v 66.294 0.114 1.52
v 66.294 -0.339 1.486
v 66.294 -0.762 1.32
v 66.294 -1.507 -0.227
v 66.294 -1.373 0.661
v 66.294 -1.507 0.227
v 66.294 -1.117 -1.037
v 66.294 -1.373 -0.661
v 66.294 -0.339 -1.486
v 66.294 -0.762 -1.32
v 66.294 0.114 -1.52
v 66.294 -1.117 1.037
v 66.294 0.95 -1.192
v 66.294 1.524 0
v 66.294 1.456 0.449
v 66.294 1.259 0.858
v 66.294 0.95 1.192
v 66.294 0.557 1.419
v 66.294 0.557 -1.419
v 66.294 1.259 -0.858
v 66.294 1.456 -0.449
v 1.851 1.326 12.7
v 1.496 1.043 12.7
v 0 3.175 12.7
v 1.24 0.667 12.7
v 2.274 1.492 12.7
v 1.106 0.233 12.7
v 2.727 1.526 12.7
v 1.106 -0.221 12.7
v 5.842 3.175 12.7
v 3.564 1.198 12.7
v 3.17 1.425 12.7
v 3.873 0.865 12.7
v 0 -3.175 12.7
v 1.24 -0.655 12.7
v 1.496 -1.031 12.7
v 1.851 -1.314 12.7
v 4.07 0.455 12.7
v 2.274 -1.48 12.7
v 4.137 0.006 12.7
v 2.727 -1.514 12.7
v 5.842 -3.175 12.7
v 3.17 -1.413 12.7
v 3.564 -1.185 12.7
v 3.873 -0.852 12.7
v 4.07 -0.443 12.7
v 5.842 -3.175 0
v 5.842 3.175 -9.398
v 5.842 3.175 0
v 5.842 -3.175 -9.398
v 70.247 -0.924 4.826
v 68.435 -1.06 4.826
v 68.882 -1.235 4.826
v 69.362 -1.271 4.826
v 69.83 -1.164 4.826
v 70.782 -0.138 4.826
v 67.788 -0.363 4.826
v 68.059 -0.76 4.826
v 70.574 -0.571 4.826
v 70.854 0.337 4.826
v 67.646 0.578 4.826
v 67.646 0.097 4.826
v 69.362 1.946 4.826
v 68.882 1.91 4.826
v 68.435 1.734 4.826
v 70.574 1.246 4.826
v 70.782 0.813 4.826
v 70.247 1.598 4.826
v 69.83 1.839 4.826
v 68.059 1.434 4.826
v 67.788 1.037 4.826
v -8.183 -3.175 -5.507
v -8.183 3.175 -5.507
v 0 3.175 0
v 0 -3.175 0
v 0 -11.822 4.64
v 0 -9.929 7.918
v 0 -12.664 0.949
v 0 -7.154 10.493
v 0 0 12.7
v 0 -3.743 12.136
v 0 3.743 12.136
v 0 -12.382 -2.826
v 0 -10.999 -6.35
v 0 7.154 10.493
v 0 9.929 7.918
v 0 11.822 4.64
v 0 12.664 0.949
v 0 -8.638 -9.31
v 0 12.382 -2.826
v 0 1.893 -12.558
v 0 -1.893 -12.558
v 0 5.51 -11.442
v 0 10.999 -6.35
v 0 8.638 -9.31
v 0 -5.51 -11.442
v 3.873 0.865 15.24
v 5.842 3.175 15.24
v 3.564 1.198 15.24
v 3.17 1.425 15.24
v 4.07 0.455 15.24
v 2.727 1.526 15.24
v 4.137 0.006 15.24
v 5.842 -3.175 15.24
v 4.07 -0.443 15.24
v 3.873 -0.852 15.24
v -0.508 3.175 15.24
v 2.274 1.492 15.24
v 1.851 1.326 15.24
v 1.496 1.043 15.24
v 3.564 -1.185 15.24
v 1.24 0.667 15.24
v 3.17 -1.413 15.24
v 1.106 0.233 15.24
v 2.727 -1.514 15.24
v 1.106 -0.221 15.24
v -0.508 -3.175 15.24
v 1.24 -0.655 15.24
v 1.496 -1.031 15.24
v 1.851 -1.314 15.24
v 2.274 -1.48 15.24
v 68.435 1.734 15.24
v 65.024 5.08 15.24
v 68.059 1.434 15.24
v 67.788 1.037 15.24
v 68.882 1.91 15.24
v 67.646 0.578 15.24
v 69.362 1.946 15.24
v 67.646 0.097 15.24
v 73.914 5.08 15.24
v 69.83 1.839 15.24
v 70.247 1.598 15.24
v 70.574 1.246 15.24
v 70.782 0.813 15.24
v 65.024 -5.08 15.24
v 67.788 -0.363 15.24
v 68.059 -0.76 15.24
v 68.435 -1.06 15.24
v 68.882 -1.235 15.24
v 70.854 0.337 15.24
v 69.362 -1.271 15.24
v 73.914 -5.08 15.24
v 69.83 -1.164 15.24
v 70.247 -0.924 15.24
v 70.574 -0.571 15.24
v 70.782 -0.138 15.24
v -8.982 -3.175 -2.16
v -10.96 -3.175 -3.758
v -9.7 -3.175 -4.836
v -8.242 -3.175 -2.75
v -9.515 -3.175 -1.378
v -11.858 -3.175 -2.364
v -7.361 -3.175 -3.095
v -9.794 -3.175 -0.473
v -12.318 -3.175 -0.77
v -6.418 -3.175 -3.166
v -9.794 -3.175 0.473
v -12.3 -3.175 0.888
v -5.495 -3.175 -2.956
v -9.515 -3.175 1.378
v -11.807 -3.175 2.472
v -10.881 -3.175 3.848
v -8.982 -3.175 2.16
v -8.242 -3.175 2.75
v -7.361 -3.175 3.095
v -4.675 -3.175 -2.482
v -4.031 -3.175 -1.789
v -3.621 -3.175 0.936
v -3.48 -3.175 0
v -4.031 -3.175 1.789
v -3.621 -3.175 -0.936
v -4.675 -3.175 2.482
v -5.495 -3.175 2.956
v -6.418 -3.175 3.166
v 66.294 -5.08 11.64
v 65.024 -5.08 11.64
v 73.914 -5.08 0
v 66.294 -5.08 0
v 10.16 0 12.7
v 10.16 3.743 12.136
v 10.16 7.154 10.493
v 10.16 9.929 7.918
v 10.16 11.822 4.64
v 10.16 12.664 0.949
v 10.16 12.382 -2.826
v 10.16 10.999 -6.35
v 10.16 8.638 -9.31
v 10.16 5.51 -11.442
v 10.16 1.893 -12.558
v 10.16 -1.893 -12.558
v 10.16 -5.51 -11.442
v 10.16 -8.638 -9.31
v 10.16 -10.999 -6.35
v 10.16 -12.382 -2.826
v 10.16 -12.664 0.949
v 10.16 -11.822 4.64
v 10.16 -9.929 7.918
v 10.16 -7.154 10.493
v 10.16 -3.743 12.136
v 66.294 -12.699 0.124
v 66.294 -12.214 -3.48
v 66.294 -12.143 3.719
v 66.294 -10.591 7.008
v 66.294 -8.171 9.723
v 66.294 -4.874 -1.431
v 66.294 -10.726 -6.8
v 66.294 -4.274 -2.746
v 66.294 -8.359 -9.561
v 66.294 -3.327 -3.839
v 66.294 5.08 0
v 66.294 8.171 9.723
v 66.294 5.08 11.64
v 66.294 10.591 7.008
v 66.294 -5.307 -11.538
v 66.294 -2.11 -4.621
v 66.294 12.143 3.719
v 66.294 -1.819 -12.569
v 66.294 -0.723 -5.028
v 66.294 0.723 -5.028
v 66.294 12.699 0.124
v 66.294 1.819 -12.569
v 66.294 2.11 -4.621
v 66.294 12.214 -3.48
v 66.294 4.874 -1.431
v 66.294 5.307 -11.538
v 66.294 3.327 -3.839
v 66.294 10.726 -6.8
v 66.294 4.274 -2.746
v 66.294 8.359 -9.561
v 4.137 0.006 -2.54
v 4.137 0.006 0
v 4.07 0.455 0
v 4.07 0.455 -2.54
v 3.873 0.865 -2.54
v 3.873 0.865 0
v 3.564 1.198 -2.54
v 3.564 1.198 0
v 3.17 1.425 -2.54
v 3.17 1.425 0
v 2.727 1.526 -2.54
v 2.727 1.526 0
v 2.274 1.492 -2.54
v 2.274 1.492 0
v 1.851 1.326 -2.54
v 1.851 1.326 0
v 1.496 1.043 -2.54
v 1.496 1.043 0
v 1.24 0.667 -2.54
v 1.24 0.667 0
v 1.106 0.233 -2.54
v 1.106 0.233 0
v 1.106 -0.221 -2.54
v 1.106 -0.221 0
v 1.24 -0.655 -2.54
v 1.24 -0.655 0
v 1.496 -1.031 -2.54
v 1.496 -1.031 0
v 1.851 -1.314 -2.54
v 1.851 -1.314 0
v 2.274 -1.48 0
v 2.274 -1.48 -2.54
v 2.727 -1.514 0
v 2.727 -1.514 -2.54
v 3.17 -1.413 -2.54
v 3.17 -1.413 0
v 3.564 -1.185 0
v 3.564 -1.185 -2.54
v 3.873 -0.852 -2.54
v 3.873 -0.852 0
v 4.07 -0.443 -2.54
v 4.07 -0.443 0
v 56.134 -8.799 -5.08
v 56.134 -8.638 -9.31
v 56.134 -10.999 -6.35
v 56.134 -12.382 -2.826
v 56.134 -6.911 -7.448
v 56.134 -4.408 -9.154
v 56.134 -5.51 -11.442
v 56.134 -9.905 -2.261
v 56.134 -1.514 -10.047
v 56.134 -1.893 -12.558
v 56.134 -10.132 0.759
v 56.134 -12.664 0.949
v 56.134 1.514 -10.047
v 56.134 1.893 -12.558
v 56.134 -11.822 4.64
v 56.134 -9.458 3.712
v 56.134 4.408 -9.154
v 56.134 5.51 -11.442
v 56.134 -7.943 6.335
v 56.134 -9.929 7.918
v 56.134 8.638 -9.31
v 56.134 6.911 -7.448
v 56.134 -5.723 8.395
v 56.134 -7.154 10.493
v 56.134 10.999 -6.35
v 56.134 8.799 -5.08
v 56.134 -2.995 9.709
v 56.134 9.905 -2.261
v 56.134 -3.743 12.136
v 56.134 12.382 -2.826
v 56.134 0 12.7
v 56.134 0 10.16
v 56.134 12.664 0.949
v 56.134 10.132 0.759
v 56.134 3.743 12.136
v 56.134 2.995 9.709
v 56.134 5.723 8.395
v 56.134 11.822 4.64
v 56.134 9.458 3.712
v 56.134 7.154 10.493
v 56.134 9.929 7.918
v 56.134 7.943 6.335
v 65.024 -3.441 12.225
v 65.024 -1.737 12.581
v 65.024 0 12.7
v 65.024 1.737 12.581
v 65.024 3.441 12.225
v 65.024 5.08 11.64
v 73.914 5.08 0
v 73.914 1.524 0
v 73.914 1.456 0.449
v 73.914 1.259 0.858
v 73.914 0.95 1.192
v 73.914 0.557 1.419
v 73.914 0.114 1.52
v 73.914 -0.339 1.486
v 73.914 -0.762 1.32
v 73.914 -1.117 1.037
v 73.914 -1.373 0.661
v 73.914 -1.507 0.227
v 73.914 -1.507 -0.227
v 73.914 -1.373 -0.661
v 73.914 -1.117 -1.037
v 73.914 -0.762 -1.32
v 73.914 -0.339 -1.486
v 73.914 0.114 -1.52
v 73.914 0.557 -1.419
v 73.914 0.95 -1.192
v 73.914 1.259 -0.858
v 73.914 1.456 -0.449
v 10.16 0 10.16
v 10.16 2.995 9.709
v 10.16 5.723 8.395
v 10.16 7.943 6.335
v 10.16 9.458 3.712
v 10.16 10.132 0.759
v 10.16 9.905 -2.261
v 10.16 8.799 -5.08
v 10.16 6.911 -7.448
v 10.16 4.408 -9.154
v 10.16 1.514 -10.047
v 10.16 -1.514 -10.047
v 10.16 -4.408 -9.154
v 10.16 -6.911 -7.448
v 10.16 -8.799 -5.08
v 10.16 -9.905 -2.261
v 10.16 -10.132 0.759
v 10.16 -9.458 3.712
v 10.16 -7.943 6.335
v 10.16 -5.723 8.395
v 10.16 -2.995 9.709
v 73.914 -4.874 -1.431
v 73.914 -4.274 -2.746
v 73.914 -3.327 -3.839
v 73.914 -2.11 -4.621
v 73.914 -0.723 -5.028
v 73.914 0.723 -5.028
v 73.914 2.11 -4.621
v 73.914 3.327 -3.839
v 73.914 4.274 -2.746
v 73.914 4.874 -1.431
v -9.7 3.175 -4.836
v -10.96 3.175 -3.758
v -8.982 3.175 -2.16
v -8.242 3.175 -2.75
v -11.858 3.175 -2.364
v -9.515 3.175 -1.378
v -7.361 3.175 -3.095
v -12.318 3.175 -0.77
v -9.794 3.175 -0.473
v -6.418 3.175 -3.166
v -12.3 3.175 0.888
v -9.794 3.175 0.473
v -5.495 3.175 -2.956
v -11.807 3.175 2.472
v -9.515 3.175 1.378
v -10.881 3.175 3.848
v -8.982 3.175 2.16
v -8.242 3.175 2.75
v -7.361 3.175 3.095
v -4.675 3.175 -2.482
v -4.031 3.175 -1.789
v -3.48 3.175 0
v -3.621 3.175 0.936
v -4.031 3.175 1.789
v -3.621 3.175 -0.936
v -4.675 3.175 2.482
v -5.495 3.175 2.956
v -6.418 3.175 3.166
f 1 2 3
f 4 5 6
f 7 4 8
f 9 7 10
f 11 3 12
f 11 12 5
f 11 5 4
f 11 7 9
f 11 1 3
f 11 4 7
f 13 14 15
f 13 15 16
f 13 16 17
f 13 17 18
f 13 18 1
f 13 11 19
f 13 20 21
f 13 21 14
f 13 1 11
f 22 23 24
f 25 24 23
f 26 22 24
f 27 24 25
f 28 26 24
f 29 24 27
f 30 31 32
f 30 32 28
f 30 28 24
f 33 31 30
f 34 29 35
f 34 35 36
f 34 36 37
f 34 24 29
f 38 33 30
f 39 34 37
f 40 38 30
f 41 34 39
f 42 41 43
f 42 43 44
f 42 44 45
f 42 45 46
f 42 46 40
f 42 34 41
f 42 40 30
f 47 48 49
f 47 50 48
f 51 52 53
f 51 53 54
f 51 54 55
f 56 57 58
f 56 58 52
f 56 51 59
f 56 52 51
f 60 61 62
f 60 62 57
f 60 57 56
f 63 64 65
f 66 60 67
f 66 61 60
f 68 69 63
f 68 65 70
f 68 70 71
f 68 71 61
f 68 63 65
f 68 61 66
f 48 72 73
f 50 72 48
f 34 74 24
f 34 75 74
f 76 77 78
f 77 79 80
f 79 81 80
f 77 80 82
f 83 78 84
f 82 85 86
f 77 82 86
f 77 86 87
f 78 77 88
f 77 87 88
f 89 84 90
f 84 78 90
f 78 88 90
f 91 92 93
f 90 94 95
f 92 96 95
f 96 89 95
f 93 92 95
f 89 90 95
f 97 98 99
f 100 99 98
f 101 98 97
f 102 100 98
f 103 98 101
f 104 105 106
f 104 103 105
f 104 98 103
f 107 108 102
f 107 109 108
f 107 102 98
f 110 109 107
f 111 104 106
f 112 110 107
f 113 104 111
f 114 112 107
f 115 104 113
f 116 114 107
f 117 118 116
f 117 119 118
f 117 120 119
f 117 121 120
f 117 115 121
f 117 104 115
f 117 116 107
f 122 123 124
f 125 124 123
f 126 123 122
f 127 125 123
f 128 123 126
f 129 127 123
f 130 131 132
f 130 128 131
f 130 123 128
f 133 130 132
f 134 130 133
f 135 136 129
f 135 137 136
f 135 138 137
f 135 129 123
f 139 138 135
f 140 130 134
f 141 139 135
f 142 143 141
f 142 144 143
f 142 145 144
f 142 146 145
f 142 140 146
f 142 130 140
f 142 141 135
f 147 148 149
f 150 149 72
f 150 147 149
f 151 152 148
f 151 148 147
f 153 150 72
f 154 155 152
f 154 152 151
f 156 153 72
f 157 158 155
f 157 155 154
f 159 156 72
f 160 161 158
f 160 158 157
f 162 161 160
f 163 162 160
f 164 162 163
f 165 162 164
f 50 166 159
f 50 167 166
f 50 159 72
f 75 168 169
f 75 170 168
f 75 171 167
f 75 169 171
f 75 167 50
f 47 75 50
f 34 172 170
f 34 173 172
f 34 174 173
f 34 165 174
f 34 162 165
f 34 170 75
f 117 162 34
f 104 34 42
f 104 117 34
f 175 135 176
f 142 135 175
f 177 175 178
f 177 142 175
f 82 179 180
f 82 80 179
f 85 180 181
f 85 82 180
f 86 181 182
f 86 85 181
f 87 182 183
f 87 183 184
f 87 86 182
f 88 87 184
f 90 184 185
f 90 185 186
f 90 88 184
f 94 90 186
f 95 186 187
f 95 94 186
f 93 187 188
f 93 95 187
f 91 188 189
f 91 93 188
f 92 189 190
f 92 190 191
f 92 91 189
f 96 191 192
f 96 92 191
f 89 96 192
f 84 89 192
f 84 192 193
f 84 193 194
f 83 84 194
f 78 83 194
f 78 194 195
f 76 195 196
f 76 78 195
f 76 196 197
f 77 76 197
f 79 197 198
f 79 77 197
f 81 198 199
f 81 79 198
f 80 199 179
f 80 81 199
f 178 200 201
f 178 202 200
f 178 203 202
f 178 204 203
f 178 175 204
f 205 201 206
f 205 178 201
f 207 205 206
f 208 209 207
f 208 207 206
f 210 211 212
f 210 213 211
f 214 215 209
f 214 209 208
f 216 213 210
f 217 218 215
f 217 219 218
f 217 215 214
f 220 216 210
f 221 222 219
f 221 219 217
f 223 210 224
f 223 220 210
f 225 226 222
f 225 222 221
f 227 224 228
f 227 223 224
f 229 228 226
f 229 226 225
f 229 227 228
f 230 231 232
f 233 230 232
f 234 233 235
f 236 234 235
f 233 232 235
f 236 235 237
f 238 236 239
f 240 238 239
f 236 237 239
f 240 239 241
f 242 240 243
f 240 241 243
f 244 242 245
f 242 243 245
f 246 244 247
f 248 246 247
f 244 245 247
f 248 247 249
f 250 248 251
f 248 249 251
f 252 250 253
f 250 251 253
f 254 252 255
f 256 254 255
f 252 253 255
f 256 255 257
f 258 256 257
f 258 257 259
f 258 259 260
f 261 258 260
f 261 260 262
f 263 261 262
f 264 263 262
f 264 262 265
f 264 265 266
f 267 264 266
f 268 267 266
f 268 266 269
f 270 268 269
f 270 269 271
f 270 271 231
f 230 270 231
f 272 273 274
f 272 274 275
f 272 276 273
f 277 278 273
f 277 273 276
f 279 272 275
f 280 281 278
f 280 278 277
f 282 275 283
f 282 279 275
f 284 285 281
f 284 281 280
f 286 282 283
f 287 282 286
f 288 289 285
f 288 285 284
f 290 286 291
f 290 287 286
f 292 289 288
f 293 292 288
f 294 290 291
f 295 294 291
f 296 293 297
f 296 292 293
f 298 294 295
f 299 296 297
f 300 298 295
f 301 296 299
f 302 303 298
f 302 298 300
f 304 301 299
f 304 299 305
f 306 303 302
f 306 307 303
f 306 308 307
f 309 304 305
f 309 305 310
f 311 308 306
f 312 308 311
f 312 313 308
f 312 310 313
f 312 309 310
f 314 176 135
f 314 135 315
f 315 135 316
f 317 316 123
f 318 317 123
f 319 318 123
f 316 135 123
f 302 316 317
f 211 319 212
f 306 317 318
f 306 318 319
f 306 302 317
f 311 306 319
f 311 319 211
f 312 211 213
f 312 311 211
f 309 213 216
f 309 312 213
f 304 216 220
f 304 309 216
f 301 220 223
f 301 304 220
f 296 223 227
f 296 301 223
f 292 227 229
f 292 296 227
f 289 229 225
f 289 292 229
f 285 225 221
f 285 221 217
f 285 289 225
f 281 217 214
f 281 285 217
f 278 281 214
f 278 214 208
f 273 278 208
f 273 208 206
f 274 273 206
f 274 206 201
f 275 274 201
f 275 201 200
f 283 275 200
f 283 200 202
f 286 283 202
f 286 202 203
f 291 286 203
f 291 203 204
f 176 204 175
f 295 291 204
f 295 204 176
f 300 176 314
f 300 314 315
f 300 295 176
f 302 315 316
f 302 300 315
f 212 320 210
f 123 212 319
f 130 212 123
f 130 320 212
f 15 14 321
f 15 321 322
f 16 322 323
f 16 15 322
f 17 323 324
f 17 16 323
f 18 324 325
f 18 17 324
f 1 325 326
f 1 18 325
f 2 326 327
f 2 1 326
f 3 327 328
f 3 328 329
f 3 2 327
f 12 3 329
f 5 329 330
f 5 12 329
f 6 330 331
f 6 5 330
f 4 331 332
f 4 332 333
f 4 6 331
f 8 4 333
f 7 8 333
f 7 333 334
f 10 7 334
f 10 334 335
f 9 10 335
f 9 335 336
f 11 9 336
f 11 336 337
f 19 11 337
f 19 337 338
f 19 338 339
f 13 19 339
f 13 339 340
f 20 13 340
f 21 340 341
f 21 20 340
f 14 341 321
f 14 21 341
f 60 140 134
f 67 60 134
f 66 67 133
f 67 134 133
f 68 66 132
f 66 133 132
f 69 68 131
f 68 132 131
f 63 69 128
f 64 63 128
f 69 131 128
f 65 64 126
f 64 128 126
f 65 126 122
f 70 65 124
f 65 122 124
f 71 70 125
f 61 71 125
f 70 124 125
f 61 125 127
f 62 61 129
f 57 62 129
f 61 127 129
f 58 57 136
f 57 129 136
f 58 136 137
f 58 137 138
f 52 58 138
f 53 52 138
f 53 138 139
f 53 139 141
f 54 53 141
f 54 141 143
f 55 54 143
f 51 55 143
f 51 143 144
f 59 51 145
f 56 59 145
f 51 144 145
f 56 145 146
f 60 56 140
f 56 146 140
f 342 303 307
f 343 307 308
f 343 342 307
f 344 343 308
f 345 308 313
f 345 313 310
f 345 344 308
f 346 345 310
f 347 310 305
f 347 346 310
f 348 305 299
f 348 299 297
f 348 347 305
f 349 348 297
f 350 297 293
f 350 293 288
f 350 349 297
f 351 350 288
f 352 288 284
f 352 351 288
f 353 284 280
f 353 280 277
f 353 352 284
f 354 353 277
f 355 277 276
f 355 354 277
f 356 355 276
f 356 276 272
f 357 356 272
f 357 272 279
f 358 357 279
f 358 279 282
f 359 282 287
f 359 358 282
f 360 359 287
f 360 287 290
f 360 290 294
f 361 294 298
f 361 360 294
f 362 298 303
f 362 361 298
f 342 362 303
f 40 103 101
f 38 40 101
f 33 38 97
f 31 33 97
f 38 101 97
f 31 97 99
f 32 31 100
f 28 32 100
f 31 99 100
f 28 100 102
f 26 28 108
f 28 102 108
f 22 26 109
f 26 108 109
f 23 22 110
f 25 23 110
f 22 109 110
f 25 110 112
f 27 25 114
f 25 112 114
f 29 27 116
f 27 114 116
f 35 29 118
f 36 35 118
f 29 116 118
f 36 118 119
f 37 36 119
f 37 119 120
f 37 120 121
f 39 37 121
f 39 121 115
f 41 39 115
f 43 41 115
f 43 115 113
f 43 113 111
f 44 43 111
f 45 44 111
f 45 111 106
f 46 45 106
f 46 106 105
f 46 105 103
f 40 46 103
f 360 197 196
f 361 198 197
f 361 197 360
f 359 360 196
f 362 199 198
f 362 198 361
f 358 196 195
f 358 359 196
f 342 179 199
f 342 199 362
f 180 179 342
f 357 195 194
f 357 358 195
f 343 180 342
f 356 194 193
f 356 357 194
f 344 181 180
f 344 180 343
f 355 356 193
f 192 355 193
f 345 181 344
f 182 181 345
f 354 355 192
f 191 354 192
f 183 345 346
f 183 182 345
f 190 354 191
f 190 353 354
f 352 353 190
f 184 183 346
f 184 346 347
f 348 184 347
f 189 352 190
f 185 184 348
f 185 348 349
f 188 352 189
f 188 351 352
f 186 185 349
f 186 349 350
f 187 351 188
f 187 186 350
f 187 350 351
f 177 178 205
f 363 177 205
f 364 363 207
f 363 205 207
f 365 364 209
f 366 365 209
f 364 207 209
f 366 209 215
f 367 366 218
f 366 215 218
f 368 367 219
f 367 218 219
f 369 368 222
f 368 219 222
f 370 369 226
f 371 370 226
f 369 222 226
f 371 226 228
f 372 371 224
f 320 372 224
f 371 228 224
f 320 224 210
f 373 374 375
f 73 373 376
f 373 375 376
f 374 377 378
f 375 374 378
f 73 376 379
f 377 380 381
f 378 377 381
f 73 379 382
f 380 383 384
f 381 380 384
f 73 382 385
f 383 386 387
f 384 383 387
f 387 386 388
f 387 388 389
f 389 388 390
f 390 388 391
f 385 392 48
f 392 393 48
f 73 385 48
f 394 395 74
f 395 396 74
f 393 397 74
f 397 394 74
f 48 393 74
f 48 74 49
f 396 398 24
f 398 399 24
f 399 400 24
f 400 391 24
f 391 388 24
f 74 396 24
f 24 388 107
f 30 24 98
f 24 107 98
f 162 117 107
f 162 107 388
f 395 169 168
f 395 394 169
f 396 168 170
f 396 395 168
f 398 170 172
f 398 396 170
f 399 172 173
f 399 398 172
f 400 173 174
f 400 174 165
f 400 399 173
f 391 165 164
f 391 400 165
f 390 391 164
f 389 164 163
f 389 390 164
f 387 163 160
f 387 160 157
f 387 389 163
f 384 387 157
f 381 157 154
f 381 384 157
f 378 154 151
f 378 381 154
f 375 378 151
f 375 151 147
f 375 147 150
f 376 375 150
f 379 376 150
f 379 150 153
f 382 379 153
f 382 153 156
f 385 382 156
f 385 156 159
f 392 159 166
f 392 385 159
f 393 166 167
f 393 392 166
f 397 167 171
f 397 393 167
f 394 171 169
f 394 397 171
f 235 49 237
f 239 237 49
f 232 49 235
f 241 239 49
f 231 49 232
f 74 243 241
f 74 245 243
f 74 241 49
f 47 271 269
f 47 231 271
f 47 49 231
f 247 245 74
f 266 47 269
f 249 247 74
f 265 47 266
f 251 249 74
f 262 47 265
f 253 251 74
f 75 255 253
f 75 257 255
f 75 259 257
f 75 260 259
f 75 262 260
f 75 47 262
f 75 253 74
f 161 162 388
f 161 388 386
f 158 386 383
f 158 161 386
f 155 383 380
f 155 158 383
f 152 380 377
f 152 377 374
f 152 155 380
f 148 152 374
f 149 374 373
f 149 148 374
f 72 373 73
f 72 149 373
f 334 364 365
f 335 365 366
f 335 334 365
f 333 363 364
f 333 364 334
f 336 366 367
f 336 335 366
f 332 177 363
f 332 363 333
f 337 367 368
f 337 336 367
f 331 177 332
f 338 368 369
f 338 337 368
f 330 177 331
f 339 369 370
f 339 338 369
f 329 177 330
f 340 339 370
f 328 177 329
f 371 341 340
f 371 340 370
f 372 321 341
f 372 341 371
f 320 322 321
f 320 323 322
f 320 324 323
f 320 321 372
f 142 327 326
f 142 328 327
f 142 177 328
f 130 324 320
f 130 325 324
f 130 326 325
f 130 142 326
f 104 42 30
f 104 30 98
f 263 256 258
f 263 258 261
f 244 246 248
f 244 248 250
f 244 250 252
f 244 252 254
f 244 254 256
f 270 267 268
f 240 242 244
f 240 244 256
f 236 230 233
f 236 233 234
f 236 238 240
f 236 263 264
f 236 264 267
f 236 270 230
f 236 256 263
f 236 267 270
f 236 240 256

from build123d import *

# Parameters (mm, degrees)
F0_W     = 5.842
F0_H     = 12.7
F0_R     = 3.175
F2_DEPTH = 3.175
F3_R     = 1.524
F4_DEPTH = 7.62
F5_DEPTH = 1.27
F6_R     = 1.524
F7_DEPTH = 17.78
F8_R     = 1.6129
F9_DEPTH = 10.414


with BuildPart() as f1:
    # F0 (on Front) → F1 (revolve)
    with BuildSketch(Plane.XZ):
        Polygon((5.842, 12.7), (5.842, 0), (66.294, 0), (66.294, 12.7), (56.134, 12.7), (56.134, 10.16), (10.16, 10.16), (10.16, 12.7), align=None)
        with Locations((2.921, 6.35)):
            Rectangle(F0_W, F0_H)
    revolve(axis=Axis((33.147, 0, 0), (-1, 0, 0)))

    # F3 (on face) → F4 (join)
    with BuildSketch(Plane.YZ.offset(66.294)):
        with BuildLine():
            ThreePointArc((-5.08, 0), (0, -5.08), (5.08, 0))
            ThreePointArc((5.08, 0), (0, 5.08), (-5.08, 0))
        make_face()
        Circle(F3_R, mode=Mode.SUBTRACT)
        with BuildLine():
            ThreePointArc((-5.08, 0), (0, 5.08), (5.08, 0))
            Line((5.08, 0), (5.08, 11.6397422652))
            ThreePointArc((5.08, 11.6397422652), (0, 12.7), (-5.08, 11.6397422652))
            Line((-5.08, 11.6397422652), (-5.08, 0))
        make_face()
        with BuildLine():
            ThreePointArc((-5.08, 11.6397422652), (0, 12.7), (5.08, 11.6397422652))
            Line((5.08, 11.6397422652), (5.08, 15.24))
            Line((5.08, 15.24), (-5.08, 15.24))
            Line((-5.08, 15.24), (-5.08, 11.6397422652))
        make_face()
    extrude(amount=F4_DEPTH)

    # F5 (add): a face of the model
    f5_faces = [f1.faces().sort_by_distance(p)[0] for p in [
        (66.294, 0, 13.7792682875),
    ]]
    extrude(f5_faces, amount=F5_DEPTH)

    # F8 (on face) → F9 (cut)
    with BuildSketch(Plane.XY.offset(15.24)):
        with Locations((69.2411065102, 0.3372866195)):
            Circle(F8_R)
    extrude(amount=-F9_DEPTH, mode=Mode.SUBTRACT)


with BuildPart() as f2:
    # F0 (on Front) → F2 (new body, symmetric)
    with BuildSketch(Plane.XZ):
        with BuildLine():
            ThreePointArc((-8.1826630726, -5.5069827884), (-3.1957909266, -4.5493385486), (-0.9398, 0))
            ThreePointArc((-0.9398, 0), (-4.5919612295, 5.3297205562), (-10.8806298187, 3.8475430269))
            ThreePointArc((-10.8806298187, 3.8475430269), (-12.1459778134, -1.5837270034), (-8.1826630726, -5.5069827884))
        make_face()
        with Locations((-6.6548, 0)):
            Circle(F0_R, mode=Mode.SUBTRACT)
        with BuildLine():
            Line((-0.9398, 0), (0, 0))
            Line((0, 0), (0, 12.7))
            Line((0, 12.7), (5.842, 12.7))
            Line((5.842, 12.7), (5.842, 15.24))
            Line((5.842, 15.24), (-0.508, 15.24))
            Line((-0.508, 15.24), (-10.8806298187, 3.8475430269))
            ThreePointArc((-10.8806298187, 3.8475430269), (-4.5919612295, 5.3297205562), (-0.9398, 0))
        make_face()
        with BuildLine():
            Line((5.842, 0), (0, 0))
            Line((0, 0), (-0.9398, 0))
            ThreePointArc((-0.9398, 0), (-3.1957909266, -4.5493385486), (-8.1826630726, -5.5069827884))
            Line((-8.1826630726, -5.5069827884), (5.842, -9.398))
            Line((5.842, -9.398), (5.842, 0))
        make_face()
    extrude(amount=F2_DEPTH, both=True)

    # F6 (on face) → F7 (cut)
    with BuildSketch(Plane.XY.offset(15.24)):
        with Locations((2.613324672, 0.0060308498)):
            Circle(F6_R)
    extrude(amount=-F7_DEPTH, mode=Mode.SUBTRACT)


solid = Compound([f1.part, f2.part])
